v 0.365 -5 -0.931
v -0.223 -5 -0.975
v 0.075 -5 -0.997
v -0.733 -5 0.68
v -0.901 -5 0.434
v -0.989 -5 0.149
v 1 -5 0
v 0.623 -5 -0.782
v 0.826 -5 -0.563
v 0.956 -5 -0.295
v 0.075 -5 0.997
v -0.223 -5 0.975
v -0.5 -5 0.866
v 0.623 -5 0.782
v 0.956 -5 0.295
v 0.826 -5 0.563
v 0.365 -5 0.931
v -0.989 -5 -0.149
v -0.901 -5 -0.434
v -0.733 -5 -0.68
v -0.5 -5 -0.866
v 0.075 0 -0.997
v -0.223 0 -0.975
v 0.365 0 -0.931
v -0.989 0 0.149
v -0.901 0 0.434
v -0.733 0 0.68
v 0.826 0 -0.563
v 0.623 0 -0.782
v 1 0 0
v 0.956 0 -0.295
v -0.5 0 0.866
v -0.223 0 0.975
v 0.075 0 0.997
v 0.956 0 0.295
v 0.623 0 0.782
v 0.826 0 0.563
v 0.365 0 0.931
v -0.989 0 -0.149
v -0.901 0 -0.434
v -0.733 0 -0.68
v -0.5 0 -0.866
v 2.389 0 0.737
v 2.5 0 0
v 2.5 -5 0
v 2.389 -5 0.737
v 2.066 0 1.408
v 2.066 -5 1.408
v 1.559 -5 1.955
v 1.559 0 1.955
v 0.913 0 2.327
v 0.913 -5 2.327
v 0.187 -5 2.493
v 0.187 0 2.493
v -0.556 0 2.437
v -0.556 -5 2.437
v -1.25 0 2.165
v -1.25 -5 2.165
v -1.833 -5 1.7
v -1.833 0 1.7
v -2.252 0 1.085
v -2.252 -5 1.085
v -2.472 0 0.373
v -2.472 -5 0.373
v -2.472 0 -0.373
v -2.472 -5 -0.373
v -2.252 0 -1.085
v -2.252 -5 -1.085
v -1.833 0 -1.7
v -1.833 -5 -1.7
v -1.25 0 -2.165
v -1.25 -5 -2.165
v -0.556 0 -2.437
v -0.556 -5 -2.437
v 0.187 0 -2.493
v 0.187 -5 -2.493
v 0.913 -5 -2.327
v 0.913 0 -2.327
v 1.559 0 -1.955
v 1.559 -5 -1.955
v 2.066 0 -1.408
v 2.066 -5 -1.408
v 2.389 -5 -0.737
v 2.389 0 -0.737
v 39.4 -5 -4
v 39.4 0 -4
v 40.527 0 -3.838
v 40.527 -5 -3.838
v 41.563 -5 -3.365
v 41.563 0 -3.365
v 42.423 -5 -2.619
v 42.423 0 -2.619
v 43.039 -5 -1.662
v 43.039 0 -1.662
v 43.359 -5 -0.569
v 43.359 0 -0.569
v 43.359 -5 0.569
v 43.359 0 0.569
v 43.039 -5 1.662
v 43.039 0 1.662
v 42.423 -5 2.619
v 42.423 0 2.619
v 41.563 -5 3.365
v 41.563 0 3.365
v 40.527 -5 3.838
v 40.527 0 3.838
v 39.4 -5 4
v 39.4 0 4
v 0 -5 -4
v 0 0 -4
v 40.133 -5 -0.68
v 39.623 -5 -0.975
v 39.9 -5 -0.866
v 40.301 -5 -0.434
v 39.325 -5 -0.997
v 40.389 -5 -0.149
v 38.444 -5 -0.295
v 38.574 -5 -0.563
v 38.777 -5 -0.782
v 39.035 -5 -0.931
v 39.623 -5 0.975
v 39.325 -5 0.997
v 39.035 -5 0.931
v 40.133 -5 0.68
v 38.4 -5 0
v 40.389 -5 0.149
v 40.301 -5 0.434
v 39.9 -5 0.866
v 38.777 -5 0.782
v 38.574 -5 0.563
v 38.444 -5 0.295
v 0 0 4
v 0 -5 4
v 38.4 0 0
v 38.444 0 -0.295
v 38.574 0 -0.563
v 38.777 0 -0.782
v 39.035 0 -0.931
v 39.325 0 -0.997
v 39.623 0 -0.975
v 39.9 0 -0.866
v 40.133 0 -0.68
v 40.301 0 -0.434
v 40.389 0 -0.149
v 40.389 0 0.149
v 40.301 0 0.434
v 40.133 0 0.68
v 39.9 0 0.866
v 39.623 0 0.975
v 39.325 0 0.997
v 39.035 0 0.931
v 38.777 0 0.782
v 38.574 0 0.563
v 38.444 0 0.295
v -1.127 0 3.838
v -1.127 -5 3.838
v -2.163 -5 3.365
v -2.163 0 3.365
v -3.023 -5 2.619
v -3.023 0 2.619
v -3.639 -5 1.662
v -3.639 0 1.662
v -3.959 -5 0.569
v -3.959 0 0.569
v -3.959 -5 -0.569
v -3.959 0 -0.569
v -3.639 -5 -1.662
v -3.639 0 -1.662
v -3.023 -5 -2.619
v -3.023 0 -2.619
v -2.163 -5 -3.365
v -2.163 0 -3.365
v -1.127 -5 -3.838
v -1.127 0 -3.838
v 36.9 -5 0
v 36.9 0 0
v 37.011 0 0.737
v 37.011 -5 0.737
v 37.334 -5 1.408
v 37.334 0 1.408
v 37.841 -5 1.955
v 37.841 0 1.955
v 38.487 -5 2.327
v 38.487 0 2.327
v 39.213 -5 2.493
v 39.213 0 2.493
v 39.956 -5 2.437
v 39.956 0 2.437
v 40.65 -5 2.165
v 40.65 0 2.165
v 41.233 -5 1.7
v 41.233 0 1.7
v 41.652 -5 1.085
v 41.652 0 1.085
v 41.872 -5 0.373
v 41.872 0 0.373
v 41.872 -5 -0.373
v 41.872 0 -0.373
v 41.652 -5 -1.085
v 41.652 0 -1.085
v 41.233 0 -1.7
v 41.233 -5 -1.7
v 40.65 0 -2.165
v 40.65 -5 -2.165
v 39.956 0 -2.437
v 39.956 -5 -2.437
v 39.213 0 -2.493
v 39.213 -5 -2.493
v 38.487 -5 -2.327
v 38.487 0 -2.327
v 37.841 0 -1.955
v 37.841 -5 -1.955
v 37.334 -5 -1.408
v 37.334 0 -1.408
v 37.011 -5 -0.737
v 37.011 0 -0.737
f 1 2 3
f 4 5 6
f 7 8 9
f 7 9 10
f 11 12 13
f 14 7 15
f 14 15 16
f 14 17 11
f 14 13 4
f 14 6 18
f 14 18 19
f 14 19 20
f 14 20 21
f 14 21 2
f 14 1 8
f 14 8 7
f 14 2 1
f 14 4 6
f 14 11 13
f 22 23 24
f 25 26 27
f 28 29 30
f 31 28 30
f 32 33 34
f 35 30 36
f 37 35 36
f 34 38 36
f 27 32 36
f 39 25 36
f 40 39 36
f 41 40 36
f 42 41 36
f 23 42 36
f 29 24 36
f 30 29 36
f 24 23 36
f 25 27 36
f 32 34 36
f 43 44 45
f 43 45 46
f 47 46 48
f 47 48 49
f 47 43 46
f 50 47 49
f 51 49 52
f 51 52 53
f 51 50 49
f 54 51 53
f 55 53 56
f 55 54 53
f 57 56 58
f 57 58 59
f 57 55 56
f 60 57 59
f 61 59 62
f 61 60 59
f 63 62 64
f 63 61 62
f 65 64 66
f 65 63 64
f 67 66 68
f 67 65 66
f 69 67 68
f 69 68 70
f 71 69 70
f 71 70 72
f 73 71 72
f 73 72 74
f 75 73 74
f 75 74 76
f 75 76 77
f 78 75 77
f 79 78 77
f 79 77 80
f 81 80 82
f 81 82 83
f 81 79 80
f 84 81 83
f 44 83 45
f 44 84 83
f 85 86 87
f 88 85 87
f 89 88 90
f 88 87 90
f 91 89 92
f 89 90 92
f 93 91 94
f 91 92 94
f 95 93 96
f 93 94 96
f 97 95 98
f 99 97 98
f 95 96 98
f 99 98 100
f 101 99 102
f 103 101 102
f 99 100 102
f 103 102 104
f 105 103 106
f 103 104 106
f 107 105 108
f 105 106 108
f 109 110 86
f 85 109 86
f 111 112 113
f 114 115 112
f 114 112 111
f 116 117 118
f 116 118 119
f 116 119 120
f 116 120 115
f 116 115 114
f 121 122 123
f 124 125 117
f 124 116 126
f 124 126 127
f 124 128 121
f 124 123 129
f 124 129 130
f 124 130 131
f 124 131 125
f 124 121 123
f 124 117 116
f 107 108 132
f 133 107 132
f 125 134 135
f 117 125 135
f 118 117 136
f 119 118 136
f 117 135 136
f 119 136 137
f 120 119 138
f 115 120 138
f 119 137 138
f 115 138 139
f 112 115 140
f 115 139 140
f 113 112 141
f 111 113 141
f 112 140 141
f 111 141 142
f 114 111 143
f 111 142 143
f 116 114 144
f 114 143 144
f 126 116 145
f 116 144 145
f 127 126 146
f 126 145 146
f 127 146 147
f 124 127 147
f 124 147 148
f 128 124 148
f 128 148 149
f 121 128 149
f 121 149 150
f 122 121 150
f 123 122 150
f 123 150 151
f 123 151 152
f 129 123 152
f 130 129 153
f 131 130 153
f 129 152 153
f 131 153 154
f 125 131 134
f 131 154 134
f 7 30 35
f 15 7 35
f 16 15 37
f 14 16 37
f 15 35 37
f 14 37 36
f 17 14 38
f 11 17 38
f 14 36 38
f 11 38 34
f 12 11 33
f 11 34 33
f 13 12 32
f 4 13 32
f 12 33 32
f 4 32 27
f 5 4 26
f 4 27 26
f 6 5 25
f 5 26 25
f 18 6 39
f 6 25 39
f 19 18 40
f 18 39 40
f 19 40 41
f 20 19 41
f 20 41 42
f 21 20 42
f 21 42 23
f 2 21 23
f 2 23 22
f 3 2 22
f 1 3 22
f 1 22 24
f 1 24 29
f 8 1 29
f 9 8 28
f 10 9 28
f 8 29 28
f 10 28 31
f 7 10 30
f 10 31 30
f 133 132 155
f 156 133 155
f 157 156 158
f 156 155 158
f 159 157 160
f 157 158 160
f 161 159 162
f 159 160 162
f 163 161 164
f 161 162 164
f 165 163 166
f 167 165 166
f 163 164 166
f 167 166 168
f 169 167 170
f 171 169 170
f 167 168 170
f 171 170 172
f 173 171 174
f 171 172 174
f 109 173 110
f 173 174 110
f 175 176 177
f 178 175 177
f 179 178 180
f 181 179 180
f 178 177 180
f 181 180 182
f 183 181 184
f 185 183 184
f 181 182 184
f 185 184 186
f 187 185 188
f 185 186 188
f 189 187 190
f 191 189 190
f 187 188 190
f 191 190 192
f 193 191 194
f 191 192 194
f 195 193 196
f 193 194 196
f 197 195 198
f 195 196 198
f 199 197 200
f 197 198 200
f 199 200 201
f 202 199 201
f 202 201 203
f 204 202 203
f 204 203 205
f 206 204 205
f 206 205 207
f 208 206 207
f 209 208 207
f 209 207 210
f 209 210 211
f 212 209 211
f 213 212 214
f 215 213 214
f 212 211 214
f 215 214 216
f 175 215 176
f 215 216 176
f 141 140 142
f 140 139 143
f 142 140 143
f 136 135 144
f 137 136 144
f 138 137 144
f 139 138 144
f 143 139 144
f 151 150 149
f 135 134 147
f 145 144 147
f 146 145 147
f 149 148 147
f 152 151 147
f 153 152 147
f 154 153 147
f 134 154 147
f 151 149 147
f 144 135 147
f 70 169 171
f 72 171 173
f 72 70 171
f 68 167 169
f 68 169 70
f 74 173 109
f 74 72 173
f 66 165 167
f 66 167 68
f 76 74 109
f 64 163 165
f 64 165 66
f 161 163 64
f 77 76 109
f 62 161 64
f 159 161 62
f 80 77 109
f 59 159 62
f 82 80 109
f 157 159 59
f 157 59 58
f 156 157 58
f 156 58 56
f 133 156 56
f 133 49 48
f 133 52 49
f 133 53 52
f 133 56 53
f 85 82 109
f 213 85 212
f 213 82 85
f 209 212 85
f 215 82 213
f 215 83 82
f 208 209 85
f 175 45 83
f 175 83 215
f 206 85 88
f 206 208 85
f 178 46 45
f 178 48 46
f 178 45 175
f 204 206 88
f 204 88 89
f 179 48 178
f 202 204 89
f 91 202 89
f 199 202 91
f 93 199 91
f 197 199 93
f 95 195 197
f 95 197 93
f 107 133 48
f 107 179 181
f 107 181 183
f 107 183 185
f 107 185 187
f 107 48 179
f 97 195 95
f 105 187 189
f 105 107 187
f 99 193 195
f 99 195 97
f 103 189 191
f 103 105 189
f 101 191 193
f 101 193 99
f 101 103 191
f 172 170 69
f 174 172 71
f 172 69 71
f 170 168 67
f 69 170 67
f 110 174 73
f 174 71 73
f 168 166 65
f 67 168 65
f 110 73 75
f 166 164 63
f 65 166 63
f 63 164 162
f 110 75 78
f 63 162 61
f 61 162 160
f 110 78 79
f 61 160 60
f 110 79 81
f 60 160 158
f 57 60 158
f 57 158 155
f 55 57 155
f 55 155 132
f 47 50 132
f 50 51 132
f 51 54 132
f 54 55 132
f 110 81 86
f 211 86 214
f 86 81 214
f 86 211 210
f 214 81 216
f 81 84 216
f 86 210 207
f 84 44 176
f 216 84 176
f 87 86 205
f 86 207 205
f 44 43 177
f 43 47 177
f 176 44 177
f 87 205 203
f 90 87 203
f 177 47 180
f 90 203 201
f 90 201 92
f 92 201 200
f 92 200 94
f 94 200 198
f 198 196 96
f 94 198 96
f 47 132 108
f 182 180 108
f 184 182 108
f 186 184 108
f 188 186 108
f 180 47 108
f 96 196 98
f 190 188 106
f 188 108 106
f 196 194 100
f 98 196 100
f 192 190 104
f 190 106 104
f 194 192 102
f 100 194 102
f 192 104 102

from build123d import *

# Parameters (mm, degrees)
F0_R     = 1
F1_DEPTH = 5
F0_R_2   = 2.5


with BuildPart() as f1:
    # F0 (on Front) → F1 (new body)
    with BuildSketch(Plane.XZ):
        Circle(F0_R)
    extrude(amount=F1_DEPTH)


with BuildPart() as f1b:
    # F0 (on Front) → F1, piece 2 (new body)
    with BuildSketch(Plane.XZ):
        with BuildLine():
            Line((39.4, 4), (0, 4))
            ThreePointArc((0, 4), (-4, 0), (0, -4))
            Line((0, -4), (39.4, -4))
            ThreePointArc((39.4, -4), (43.4, 0), (39.4, 4))
        make_face()
        Circle(F0_R_2, mode=Mode.SUBTRACT)
        with BuildLine():
            ThreePointArc((41.9, 0), (39.4, -2.5), (36.9, 0))
            ThreePointArc((36.9, 0), (39.4, 2.5), (41.9, 0))
        make_face(mode=Mode.SUBTRACT)
    extrude(amount=F1_DEPTH)


with BuildPart() as f1c:
    # F0 (on Front) → F1, piece 3 (new body)
    with BuildSketch(Plane.XZ):
        with BuildLine():
            ThreePointArc((40.4, 0), (39.4, 1), (38.4, 0))
            ThreePointArc((38.4, 0), (39.4, -1), (40.4, 0))
        make_face()
    extrude(amount=F1_DEPTH)


solid = Compound([f1.part, f1b.part, f1c.part])
